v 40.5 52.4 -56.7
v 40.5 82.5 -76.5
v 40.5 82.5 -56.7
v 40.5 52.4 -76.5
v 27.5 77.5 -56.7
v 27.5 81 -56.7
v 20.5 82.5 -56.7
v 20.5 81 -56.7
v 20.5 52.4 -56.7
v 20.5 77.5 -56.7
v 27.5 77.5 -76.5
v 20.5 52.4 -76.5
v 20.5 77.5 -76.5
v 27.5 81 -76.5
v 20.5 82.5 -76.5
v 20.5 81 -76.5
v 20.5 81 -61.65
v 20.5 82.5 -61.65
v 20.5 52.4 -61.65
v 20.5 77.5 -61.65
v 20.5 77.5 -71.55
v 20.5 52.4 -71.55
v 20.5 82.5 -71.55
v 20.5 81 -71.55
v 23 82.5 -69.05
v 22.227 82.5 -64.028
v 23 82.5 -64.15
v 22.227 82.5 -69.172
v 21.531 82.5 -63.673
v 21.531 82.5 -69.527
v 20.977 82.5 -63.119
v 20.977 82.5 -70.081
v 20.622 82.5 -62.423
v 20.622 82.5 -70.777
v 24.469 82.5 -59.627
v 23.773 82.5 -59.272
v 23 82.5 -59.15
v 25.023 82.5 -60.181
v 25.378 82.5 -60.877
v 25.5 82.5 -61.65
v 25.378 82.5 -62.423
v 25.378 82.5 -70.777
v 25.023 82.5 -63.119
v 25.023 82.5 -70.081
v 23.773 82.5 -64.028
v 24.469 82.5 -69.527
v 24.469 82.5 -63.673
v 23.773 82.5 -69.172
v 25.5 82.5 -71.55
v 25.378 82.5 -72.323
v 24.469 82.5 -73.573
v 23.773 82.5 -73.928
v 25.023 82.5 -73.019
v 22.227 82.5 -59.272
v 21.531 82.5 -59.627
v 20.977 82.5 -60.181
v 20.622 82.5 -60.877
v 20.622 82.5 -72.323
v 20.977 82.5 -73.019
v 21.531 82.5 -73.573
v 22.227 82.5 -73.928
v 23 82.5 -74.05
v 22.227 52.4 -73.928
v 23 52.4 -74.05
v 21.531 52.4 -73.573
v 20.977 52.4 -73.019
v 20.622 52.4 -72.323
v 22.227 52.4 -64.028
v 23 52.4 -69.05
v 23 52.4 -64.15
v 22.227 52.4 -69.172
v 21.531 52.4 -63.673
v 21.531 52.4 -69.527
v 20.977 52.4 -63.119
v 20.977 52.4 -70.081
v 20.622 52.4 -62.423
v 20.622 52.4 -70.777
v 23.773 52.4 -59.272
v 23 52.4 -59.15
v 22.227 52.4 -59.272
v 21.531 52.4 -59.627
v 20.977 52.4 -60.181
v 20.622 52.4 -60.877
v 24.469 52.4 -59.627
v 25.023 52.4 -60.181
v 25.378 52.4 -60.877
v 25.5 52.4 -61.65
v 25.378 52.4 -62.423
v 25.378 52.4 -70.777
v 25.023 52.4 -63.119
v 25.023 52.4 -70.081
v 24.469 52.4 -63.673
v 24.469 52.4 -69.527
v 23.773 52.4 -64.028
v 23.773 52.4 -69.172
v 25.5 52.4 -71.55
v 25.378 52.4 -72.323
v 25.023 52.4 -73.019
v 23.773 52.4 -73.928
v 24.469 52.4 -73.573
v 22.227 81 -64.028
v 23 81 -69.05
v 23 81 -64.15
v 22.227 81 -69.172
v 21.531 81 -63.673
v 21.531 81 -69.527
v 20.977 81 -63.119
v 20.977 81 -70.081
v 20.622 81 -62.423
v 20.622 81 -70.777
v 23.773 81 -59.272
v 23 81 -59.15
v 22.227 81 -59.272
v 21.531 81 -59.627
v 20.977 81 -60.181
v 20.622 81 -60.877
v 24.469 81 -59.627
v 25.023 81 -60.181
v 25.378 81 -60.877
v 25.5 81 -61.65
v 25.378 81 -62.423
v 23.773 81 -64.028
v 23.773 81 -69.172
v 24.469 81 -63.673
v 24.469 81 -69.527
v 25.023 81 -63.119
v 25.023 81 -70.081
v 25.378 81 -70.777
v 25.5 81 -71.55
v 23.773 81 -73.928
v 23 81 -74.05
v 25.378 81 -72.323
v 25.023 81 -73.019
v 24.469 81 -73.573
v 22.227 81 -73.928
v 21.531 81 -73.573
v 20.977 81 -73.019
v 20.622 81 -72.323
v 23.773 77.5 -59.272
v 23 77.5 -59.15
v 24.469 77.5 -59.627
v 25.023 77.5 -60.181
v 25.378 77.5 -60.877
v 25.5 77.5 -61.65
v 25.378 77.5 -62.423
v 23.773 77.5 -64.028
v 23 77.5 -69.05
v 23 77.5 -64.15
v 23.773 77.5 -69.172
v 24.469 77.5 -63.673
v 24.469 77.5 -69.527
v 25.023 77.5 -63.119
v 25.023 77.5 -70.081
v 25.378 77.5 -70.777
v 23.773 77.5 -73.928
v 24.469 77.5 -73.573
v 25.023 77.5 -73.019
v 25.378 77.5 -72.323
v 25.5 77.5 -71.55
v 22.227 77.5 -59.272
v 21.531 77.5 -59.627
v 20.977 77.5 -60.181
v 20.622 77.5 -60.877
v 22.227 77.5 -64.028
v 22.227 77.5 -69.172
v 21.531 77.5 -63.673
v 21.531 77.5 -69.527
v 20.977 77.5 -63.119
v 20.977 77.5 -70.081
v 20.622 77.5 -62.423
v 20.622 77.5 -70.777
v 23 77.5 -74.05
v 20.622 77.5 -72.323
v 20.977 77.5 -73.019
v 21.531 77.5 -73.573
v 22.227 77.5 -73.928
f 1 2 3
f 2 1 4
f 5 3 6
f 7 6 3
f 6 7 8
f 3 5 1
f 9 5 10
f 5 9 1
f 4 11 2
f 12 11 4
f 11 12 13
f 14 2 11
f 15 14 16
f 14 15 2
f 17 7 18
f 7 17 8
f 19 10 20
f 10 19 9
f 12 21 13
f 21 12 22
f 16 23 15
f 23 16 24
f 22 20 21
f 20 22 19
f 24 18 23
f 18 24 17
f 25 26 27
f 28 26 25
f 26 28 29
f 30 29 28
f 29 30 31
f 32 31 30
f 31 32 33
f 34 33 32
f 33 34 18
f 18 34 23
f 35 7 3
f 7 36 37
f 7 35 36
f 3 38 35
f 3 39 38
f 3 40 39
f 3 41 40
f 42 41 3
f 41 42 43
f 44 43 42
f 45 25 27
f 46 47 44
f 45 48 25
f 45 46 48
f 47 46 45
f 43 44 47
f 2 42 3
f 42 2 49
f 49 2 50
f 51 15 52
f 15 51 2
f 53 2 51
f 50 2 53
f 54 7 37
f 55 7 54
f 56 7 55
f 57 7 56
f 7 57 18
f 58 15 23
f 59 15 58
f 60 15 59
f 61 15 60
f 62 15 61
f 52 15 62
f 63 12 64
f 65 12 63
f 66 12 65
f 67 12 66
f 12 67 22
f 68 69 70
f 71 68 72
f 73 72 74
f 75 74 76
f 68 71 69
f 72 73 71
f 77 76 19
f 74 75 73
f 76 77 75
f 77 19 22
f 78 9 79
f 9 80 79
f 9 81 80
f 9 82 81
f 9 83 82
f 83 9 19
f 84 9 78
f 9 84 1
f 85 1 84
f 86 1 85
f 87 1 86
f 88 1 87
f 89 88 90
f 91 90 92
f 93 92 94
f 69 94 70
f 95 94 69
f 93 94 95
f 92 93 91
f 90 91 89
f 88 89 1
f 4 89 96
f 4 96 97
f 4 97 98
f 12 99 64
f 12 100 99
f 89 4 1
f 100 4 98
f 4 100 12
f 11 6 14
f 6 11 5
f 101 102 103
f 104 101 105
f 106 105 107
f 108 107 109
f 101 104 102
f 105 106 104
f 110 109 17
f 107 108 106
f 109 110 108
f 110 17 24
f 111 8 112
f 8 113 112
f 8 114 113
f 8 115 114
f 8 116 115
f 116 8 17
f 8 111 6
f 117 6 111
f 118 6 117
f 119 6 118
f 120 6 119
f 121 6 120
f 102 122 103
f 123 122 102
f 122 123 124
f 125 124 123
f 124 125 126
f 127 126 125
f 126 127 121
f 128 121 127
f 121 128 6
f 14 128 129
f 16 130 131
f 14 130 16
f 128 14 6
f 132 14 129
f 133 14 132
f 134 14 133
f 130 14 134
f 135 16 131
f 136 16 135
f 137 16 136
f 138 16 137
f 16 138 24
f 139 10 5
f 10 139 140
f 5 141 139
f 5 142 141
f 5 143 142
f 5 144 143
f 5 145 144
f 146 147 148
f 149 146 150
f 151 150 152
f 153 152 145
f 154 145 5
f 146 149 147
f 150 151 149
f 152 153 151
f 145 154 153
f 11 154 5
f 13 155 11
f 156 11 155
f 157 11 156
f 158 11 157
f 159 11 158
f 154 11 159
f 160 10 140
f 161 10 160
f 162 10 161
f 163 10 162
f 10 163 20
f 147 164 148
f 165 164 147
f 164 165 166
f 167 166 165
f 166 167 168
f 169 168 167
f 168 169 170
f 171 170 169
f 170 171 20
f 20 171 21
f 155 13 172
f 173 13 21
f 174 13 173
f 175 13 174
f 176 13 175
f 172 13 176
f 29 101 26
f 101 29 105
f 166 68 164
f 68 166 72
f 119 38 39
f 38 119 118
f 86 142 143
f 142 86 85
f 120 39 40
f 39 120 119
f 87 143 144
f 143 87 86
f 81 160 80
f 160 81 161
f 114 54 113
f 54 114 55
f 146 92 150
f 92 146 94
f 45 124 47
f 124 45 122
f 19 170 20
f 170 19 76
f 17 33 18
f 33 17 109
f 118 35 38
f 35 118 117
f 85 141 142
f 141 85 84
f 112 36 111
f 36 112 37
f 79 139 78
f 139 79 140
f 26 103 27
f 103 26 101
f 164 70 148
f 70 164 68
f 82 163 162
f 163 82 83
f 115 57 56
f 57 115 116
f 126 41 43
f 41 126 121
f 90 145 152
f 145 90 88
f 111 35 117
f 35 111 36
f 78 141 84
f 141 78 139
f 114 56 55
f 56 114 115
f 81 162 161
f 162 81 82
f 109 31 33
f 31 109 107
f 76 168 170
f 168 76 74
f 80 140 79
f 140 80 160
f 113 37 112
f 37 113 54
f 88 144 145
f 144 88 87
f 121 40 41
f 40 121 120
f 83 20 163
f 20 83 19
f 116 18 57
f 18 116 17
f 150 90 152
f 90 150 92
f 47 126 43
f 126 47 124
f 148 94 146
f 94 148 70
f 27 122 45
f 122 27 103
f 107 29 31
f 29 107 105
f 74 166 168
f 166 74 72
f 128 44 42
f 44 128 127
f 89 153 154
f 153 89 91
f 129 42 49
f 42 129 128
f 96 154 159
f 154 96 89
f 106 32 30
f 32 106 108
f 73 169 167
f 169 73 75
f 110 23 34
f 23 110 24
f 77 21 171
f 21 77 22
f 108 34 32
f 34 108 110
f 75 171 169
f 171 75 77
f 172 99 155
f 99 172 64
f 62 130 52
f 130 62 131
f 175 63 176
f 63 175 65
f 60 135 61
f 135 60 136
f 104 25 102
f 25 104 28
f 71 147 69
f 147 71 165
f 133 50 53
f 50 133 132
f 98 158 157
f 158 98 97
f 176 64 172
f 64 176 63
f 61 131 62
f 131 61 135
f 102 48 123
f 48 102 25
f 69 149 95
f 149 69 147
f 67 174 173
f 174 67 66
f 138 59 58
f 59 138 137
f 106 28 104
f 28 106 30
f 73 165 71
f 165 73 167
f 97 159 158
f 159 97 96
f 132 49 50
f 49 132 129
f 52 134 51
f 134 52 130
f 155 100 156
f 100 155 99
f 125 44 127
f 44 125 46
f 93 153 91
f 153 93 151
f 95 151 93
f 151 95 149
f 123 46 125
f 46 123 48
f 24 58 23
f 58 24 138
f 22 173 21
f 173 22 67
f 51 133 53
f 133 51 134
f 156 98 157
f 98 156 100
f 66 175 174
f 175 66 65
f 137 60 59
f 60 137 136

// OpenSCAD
//Robot Servo
RSlength = 41.0;  //x
RSwidth = 36.6;  //not the exact width, y
RSheight = 19.8;
RSdiameter = 5.0;
RSradius = RSdiameter/2;
RSdistance = (RSheight - 2*RSdiameter)/4;
RSA = 7.0;
RSB = 1.5;
RSC = 2.5;
RSD = 4.0;
RSE = 6.5;
RSF = 10.0;

//Servo Attachement
SAlength = 20.0;
SAwidth = RSwidth-RSC-RSD;
SAHwidth = RSF-RSE; //y
SAHlength = RSA;  //x
SAHheight = RSheight;

//Upper Base
UBlength = 150.0; //length is x-axis
UBwidth = 165.0; //y-axis
UBheight = 17.0;
UBgapCam = 12.0;
UBholeGap = 7.0;

LBlength = UBlength;
LBwidth = UBwidth;
LBheight = 7.0;
LBgap1 = 30.0;
LBtranslate = -80.0;

module cube_true(x, y, z){
    cube(size = [x, y, z], center = true);
}

module cylinder_base(x,y){
    cylinder(h=x,r=y,center=true,$fn=20);
}

translate([RSlength/2+SAlength/2,LBwidth/2-SAwidth/2,LBtranslate+LBheight/2+RSheight/2]){
    difference(){
        cube_true(SAlength,SAwidth,RSheight);
        translate([-(SAlength/2-RSA/2), SAwidth/2-RSE/2,0]) cube_true(SAHlength,SAHwidth,SAHheight);
        //holes
        translate([-(SAlength/2-RSradius),0,RSheight/2-RSdistance-RSradius]){
            rotate([90,0,0]) cylinder_base(SAwidth,RSradius);
        }
        translate([-(SAlength/2-RSradius),0,-(RSheight/2-RSdistance-RSradius)]){
            rotate([90,0,0]) cylinder_base(SAwidth,RSradius);
        }
    }
}
